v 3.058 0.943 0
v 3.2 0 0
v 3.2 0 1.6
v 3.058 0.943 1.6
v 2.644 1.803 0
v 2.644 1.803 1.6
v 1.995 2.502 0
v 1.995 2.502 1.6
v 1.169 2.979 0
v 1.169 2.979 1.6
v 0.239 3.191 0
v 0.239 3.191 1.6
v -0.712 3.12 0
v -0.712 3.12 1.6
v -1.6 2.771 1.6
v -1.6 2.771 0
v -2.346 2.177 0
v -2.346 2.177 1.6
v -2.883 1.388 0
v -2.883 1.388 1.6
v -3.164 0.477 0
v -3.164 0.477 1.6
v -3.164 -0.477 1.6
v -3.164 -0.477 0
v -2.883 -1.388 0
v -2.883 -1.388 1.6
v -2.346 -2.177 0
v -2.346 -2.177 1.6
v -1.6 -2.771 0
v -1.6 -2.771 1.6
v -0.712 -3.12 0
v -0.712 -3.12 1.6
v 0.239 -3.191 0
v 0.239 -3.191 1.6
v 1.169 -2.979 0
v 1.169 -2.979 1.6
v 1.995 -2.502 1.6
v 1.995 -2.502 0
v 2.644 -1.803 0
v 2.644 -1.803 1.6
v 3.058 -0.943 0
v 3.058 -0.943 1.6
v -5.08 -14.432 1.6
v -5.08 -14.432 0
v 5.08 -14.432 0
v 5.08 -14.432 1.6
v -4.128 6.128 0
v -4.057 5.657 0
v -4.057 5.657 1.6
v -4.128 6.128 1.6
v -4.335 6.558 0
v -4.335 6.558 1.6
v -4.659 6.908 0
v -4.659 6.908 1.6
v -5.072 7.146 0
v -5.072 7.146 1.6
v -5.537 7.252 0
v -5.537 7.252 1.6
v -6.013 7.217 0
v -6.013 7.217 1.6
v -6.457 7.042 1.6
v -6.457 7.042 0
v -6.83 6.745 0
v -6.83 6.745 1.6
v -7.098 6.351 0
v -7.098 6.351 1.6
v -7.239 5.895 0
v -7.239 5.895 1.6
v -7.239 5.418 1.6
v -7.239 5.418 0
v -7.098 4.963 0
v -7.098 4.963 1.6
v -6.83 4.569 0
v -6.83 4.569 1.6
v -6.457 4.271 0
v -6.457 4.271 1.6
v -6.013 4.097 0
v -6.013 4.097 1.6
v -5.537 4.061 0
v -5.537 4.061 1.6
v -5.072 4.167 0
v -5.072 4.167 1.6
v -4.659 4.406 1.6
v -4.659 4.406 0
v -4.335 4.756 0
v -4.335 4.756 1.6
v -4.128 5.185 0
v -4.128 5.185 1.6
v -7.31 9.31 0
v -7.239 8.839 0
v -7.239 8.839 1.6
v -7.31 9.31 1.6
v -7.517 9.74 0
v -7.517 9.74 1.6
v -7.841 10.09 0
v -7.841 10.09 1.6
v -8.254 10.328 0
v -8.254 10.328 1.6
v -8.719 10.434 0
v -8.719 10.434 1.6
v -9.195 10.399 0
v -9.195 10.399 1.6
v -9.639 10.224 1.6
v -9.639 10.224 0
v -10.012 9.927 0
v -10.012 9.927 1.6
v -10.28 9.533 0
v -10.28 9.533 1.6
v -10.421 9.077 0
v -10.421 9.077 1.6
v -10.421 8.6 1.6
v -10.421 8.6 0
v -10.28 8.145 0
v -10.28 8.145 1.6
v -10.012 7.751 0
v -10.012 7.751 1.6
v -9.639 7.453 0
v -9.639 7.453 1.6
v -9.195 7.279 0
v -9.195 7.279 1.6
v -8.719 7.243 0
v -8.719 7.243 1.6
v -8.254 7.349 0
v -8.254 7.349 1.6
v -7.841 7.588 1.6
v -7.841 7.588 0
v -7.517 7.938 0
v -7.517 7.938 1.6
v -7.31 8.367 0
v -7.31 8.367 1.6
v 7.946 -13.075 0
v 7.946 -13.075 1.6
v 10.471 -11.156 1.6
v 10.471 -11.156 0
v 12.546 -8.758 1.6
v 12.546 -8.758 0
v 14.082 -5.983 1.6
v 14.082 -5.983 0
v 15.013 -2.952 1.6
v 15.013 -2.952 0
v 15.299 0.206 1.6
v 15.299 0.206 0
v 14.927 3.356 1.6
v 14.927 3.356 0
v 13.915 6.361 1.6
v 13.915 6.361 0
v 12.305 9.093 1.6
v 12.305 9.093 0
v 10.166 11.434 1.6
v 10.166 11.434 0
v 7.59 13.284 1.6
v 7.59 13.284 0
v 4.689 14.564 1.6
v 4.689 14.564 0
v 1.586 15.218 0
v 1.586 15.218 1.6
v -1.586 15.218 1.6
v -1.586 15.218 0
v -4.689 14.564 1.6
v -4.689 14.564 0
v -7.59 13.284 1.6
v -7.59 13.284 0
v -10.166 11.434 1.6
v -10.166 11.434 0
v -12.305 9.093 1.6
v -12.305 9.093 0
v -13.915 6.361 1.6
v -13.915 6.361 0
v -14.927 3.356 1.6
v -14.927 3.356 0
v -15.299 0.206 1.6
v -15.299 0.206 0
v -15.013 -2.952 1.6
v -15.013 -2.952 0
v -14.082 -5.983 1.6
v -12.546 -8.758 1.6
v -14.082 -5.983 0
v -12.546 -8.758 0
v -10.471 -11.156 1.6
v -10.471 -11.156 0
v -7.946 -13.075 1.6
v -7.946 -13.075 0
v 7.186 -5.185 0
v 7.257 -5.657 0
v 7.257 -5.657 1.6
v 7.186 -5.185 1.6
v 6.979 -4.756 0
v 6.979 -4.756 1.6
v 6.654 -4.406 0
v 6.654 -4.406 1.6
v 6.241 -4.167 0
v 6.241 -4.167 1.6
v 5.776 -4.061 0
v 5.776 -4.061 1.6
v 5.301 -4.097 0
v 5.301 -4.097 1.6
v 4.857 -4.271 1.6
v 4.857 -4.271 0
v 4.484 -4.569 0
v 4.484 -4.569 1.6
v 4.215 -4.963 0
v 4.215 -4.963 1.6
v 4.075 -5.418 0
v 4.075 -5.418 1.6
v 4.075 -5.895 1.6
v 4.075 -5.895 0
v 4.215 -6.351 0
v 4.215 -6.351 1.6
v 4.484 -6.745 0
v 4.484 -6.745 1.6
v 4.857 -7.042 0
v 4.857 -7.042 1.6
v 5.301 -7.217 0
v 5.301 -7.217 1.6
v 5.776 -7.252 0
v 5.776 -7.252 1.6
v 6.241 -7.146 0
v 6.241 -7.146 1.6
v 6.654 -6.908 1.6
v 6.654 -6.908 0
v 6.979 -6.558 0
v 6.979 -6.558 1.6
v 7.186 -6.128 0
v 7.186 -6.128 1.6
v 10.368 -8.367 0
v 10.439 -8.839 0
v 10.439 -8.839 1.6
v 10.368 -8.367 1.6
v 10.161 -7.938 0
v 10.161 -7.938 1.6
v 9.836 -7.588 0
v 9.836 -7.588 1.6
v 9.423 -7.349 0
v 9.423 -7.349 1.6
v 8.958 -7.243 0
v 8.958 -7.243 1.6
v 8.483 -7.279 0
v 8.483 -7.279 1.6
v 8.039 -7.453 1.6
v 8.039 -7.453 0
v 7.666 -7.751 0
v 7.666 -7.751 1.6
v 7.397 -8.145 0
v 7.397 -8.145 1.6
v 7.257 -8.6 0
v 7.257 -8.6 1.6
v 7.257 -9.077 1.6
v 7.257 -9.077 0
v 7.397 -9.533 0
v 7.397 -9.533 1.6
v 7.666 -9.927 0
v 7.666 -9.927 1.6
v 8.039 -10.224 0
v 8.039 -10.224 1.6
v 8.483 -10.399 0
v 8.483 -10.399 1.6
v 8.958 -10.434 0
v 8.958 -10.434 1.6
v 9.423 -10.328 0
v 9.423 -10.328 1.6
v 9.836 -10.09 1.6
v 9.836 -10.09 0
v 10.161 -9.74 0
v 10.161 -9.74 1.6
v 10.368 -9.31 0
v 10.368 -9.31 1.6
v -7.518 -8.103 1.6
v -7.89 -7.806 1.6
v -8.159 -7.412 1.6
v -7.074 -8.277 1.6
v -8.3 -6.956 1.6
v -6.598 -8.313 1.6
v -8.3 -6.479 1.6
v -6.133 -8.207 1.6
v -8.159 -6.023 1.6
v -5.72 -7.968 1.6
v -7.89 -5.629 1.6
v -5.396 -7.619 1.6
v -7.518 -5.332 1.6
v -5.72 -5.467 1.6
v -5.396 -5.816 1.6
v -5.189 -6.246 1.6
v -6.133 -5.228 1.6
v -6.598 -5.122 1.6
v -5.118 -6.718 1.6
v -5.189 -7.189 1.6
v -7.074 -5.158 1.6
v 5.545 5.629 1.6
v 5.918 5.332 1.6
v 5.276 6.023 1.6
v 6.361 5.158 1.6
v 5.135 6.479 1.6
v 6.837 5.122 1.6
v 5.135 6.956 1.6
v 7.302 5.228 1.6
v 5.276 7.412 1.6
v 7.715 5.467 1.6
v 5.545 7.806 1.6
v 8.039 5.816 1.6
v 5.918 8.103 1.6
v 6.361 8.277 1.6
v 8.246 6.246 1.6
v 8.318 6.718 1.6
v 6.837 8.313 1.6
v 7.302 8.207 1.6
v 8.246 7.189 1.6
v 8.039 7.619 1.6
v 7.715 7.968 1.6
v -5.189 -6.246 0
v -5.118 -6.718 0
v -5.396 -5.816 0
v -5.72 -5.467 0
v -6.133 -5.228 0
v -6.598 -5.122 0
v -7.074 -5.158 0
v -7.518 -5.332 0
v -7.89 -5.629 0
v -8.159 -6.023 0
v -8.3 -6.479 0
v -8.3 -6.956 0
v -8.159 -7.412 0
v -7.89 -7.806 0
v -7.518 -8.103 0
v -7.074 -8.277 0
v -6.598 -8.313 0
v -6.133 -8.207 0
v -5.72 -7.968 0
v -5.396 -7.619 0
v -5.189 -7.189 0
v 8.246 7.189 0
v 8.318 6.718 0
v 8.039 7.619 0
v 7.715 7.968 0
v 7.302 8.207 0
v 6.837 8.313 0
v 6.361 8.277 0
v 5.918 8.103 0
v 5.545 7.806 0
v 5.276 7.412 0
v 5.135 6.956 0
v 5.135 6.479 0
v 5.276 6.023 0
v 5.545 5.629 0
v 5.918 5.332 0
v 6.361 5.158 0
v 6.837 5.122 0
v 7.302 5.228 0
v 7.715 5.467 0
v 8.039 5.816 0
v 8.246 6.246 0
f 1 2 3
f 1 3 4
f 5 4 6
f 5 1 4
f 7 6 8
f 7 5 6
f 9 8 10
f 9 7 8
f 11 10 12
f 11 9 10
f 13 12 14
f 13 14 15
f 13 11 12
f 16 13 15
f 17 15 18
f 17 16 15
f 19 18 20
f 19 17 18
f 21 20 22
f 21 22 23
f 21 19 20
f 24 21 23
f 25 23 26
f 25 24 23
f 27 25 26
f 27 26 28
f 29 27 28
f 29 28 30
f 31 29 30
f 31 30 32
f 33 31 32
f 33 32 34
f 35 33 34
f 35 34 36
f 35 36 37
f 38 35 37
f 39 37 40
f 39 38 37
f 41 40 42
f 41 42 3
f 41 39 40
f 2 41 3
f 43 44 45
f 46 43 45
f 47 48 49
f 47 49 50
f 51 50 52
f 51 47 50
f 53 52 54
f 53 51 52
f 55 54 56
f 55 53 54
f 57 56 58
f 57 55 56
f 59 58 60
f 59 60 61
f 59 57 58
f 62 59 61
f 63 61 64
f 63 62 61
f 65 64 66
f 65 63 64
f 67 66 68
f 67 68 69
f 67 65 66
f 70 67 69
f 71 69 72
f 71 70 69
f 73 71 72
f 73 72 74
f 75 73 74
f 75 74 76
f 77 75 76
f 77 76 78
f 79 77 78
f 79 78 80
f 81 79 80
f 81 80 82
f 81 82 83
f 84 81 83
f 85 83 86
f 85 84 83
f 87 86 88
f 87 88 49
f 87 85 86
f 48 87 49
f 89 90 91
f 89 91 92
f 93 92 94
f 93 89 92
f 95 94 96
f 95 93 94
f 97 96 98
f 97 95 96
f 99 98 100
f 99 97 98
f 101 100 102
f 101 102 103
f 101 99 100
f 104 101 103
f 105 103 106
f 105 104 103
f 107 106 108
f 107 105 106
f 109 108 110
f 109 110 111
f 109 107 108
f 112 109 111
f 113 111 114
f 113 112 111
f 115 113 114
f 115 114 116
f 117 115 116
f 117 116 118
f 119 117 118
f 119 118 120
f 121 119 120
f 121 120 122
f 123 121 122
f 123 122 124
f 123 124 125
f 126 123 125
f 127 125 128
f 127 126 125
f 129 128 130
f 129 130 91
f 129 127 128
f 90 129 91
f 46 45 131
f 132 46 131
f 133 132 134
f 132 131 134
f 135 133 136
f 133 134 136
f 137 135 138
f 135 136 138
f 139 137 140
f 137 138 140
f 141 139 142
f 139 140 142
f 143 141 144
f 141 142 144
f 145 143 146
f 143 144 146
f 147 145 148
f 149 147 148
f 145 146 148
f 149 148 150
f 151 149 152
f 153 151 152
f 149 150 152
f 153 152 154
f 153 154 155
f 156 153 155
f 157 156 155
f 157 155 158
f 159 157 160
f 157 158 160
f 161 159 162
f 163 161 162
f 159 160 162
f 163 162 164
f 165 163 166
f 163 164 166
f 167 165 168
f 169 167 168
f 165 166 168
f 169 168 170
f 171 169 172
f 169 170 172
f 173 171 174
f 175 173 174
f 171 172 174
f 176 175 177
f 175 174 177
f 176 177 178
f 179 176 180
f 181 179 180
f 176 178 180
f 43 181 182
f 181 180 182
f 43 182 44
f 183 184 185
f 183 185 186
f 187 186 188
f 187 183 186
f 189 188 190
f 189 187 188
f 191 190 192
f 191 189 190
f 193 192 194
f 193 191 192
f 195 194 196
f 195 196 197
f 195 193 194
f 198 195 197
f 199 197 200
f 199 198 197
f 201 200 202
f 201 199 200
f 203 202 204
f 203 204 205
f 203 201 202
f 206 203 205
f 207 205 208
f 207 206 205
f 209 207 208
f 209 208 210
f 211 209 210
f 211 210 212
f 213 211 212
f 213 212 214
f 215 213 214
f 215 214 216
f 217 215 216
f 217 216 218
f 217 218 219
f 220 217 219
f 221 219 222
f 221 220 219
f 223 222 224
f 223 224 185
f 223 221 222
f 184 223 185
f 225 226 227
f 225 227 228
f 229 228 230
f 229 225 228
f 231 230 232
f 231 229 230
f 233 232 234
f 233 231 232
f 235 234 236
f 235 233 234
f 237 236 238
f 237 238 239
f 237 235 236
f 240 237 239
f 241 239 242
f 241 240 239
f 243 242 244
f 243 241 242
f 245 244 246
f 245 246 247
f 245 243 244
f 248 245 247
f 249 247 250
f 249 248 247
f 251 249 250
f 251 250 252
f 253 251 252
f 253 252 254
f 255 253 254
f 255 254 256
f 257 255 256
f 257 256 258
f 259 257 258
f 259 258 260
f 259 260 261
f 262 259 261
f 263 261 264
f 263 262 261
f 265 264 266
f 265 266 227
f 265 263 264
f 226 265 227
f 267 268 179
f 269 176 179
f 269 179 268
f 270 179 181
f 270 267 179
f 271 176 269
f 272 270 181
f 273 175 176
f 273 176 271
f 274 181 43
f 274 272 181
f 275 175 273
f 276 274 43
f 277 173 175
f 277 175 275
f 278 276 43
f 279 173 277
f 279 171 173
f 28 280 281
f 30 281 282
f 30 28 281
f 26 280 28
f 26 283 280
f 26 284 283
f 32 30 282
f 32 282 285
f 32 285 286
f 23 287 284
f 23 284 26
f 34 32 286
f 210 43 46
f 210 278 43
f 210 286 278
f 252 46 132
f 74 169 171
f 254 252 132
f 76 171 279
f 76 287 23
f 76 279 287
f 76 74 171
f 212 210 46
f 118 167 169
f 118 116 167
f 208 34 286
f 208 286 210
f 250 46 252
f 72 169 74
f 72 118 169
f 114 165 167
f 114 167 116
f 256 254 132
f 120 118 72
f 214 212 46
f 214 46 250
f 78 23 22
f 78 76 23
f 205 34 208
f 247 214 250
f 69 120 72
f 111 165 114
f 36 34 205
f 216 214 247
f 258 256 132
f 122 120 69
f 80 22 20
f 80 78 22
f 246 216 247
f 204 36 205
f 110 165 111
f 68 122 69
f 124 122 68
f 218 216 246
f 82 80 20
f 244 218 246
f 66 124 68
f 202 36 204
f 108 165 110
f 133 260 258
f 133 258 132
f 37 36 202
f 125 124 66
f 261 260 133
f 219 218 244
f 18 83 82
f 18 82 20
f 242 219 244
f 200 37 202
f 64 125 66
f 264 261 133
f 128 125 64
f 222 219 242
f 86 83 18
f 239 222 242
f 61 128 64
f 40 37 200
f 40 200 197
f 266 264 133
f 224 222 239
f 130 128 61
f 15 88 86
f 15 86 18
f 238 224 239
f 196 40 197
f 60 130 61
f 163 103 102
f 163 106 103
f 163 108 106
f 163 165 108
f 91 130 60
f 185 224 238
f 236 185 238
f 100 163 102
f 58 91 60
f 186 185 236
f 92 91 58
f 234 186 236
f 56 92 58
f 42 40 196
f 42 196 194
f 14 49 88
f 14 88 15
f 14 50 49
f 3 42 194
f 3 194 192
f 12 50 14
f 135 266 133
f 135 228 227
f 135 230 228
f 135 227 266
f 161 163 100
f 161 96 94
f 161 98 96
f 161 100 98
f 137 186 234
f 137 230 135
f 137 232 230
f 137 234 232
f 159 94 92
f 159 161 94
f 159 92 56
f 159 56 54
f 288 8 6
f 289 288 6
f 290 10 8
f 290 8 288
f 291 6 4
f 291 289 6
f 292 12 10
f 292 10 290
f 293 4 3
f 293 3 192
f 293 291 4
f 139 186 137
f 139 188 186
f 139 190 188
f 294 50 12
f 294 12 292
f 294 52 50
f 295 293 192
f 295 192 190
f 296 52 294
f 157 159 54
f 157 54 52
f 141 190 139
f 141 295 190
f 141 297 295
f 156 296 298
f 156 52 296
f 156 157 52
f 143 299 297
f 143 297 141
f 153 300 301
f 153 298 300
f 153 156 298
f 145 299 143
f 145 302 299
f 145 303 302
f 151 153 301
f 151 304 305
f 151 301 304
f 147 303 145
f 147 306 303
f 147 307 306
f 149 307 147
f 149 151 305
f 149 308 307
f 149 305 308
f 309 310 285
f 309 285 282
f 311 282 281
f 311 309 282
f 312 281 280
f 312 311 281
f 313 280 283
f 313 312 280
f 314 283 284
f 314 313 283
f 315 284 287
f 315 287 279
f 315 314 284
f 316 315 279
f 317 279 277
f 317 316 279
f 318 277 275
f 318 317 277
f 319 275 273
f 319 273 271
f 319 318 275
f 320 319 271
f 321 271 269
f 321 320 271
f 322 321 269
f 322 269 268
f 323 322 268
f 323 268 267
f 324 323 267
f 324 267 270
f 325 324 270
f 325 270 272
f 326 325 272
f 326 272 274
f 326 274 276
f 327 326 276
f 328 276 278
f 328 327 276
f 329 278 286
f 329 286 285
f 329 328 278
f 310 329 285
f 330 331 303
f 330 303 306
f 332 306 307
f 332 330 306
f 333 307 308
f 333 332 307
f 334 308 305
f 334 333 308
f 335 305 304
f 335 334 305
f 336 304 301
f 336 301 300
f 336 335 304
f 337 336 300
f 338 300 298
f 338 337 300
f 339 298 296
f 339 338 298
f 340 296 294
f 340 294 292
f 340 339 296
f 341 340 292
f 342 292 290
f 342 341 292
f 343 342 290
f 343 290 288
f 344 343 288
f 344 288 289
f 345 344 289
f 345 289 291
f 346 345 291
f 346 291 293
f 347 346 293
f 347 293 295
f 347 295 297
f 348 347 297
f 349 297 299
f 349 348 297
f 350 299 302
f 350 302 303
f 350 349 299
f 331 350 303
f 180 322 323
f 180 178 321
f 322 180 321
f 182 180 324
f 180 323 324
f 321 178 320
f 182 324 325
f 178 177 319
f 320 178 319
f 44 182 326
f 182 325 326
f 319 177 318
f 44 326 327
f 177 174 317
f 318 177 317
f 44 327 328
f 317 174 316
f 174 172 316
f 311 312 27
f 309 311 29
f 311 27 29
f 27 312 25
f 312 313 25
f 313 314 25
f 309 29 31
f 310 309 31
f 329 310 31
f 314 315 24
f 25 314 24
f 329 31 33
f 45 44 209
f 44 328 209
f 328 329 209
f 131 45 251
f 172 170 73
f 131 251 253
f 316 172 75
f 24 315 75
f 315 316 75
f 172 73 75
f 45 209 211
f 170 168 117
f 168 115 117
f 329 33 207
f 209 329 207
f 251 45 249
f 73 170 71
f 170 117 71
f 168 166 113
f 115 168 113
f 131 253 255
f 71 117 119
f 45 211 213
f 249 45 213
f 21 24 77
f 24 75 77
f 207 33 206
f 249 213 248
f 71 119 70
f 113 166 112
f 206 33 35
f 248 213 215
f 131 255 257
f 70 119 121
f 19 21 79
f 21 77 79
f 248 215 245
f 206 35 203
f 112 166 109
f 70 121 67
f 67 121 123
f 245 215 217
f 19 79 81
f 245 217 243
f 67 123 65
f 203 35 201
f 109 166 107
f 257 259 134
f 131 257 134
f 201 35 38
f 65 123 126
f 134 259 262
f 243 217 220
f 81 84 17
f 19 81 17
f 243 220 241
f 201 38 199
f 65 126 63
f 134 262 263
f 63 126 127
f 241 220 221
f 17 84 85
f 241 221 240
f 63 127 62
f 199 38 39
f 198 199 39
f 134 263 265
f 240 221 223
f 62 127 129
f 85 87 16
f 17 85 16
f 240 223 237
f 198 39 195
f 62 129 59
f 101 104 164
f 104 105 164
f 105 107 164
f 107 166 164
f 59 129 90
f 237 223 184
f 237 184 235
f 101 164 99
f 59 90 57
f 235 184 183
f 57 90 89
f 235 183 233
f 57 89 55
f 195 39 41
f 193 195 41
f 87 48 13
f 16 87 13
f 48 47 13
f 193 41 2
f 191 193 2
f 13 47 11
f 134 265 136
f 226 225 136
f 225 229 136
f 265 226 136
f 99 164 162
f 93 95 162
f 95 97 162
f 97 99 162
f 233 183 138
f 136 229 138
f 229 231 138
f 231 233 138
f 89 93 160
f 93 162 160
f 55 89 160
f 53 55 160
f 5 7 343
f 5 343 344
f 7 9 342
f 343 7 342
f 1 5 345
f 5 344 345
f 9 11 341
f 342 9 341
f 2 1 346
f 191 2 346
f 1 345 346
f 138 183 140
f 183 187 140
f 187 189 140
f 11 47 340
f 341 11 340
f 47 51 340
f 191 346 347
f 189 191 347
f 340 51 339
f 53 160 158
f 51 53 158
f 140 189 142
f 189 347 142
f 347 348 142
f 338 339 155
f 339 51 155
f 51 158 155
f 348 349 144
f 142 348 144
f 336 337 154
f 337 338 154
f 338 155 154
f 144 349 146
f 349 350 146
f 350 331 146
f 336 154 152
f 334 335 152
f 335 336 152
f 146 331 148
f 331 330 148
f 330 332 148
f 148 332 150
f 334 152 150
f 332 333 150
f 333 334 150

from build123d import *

# Parameters (mm, degrees)
F0_R     = 1.6
F0_R_2   = 3.2
F1_DEPTH = 1.6


with BuildPart() as f1:
    # F0 (on Top) → F1 (new body)
    with BuildSketch(Plane.XY):
        with BuildLine():
            Line((-5.08, -14.432034), (5.08, -14.432034))
            ThreePointArc((5.08, -14.432034), (0, 15.3), (-5.08, -14.432034))
        make_face()
        with Locations((-6.717514, -6.717514)):
            Circle(F0_R, mode=Mode.SUBTRACT)
        with Locations((8.838835, -8.838835)):
            Circle(F0_R, mode=Mode.SUBTRACT)
        with Locations((5.656854, -5.656854)):
            Circle(F0_R, mode=Mode.SUBTRACT)
        Circle(F0_R_2, mode=Mode.SUBTRACT)
        with Locations((-5.656854, 5.656854)):
            Circle(F0_R, mode=Mode.SUBTRACT)
        with Locations((-8.838835, 8.838835)):
            Circle(F0_R, mode=Mode.SUBTRACT)
        with Locations((6.717514, 6.717514)):
            Circle(F0_R, mode=Mode.SUBTRACT)
    extrude(amount=F1_DEPTH)


solid = f1.part
